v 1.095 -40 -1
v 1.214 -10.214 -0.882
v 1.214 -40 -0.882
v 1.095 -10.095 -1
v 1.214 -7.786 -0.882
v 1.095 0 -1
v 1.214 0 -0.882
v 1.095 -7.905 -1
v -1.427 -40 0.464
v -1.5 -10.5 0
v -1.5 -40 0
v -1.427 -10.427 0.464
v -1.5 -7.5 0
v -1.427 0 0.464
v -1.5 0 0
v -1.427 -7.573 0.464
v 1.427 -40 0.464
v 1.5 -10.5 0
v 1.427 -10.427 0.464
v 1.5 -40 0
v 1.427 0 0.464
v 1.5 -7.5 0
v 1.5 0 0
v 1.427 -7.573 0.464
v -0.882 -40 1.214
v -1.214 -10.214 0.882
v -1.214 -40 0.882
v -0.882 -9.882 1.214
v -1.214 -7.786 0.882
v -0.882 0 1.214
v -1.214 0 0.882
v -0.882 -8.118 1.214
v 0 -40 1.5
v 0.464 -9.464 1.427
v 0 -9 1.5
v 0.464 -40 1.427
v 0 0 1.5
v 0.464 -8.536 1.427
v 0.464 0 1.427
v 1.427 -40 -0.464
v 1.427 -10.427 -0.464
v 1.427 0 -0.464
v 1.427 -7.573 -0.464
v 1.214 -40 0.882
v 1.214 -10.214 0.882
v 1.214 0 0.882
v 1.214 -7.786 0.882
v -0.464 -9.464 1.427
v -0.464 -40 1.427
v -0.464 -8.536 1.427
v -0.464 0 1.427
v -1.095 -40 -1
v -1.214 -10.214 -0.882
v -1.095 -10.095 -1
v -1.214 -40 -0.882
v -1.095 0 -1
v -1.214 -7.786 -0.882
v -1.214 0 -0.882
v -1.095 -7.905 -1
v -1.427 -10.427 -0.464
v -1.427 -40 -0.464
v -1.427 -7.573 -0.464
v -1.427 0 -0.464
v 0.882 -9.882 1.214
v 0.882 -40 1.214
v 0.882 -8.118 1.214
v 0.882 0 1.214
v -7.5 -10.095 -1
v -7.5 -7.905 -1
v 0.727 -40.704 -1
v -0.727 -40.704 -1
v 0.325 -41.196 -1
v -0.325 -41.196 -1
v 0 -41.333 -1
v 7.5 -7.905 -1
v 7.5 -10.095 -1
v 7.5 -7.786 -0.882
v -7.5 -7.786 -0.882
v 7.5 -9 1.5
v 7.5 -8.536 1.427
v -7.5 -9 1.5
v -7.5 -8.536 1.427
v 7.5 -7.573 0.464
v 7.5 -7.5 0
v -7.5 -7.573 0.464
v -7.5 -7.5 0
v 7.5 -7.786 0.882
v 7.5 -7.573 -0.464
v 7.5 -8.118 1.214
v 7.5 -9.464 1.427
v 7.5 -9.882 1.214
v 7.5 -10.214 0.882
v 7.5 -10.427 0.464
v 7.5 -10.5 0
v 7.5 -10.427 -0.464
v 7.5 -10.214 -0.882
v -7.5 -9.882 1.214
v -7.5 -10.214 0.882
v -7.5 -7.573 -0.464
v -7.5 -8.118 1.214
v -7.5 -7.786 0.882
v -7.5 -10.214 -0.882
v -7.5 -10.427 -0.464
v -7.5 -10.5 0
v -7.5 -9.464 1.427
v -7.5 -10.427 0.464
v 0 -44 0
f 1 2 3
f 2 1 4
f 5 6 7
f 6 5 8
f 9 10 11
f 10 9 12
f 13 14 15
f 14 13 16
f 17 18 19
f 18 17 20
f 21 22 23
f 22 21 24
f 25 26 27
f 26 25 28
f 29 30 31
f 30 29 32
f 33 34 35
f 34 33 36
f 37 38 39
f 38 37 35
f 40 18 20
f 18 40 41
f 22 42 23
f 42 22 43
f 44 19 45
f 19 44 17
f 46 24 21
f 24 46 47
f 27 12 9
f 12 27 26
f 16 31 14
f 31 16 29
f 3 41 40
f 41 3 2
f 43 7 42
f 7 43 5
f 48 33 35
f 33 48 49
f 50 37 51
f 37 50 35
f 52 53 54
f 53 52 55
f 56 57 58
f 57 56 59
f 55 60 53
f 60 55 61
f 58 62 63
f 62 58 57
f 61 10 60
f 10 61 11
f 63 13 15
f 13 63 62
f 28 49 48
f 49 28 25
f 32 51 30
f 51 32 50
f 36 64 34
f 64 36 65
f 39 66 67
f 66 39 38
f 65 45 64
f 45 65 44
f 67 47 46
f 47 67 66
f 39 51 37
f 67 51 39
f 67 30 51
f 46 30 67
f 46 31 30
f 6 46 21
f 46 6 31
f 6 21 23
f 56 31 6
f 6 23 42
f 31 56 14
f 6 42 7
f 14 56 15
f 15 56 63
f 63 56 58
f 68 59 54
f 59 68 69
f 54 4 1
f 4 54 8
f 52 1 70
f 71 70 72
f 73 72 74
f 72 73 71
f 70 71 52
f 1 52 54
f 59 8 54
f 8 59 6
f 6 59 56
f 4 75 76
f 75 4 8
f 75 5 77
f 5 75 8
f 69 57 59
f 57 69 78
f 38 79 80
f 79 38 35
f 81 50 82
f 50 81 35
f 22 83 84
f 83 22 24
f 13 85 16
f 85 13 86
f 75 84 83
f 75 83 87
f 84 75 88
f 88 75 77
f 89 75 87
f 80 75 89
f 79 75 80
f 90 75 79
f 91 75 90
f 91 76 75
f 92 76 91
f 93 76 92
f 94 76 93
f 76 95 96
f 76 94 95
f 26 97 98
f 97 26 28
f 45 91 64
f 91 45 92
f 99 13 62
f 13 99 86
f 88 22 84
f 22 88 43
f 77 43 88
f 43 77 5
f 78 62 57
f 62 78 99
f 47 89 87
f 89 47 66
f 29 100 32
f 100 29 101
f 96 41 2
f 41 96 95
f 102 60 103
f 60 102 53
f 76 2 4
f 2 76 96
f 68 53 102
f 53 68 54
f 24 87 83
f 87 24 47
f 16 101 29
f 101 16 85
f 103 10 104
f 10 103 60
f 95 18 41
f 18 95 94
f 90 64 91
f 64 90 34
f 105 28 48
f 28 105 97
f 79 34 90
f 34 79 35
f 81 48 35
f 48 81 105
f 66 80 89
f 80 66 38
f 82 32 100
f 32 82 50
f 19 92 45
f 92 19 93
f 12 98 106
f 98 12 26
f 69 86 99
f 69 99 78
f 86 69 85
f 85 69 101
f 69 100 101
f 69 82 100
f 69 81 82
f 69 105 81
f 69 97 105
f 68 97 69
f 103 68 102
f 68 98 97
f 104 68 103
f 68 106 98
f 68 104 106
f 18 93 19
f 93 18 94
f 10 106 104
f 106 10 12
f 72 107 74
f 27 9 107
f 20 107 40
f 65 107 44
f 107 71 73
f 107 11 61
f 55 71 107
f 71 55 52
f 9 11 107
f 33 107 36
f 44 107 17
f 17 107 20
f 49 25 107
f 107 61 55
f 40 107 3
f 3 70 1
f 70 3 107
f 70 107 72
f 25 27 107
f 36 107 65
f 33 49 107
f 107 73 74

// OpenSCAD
echo(version=version());
 
length = 40; 

difference()  {
color("grey")
rotate([90,90,0])
   cylinder(h=length, r=1.5,$fn=20);
get_square();
}
    
difference()  {
translate([-7.5, -9, 0]) 
rotate([90,90,90])
cylinder(h=15, r=1.5 ,$fn=20);
get_square();
}

difference()  {
rotate([90,90,0])
translate([0, 0, length])
 cylinder(h=4, r1=1.5, r2=0,$fn=20);
get_square();
}


module get_square () { 
translate([-10, -length-5, -2]) 
cube([20,length+5,1]);
}
